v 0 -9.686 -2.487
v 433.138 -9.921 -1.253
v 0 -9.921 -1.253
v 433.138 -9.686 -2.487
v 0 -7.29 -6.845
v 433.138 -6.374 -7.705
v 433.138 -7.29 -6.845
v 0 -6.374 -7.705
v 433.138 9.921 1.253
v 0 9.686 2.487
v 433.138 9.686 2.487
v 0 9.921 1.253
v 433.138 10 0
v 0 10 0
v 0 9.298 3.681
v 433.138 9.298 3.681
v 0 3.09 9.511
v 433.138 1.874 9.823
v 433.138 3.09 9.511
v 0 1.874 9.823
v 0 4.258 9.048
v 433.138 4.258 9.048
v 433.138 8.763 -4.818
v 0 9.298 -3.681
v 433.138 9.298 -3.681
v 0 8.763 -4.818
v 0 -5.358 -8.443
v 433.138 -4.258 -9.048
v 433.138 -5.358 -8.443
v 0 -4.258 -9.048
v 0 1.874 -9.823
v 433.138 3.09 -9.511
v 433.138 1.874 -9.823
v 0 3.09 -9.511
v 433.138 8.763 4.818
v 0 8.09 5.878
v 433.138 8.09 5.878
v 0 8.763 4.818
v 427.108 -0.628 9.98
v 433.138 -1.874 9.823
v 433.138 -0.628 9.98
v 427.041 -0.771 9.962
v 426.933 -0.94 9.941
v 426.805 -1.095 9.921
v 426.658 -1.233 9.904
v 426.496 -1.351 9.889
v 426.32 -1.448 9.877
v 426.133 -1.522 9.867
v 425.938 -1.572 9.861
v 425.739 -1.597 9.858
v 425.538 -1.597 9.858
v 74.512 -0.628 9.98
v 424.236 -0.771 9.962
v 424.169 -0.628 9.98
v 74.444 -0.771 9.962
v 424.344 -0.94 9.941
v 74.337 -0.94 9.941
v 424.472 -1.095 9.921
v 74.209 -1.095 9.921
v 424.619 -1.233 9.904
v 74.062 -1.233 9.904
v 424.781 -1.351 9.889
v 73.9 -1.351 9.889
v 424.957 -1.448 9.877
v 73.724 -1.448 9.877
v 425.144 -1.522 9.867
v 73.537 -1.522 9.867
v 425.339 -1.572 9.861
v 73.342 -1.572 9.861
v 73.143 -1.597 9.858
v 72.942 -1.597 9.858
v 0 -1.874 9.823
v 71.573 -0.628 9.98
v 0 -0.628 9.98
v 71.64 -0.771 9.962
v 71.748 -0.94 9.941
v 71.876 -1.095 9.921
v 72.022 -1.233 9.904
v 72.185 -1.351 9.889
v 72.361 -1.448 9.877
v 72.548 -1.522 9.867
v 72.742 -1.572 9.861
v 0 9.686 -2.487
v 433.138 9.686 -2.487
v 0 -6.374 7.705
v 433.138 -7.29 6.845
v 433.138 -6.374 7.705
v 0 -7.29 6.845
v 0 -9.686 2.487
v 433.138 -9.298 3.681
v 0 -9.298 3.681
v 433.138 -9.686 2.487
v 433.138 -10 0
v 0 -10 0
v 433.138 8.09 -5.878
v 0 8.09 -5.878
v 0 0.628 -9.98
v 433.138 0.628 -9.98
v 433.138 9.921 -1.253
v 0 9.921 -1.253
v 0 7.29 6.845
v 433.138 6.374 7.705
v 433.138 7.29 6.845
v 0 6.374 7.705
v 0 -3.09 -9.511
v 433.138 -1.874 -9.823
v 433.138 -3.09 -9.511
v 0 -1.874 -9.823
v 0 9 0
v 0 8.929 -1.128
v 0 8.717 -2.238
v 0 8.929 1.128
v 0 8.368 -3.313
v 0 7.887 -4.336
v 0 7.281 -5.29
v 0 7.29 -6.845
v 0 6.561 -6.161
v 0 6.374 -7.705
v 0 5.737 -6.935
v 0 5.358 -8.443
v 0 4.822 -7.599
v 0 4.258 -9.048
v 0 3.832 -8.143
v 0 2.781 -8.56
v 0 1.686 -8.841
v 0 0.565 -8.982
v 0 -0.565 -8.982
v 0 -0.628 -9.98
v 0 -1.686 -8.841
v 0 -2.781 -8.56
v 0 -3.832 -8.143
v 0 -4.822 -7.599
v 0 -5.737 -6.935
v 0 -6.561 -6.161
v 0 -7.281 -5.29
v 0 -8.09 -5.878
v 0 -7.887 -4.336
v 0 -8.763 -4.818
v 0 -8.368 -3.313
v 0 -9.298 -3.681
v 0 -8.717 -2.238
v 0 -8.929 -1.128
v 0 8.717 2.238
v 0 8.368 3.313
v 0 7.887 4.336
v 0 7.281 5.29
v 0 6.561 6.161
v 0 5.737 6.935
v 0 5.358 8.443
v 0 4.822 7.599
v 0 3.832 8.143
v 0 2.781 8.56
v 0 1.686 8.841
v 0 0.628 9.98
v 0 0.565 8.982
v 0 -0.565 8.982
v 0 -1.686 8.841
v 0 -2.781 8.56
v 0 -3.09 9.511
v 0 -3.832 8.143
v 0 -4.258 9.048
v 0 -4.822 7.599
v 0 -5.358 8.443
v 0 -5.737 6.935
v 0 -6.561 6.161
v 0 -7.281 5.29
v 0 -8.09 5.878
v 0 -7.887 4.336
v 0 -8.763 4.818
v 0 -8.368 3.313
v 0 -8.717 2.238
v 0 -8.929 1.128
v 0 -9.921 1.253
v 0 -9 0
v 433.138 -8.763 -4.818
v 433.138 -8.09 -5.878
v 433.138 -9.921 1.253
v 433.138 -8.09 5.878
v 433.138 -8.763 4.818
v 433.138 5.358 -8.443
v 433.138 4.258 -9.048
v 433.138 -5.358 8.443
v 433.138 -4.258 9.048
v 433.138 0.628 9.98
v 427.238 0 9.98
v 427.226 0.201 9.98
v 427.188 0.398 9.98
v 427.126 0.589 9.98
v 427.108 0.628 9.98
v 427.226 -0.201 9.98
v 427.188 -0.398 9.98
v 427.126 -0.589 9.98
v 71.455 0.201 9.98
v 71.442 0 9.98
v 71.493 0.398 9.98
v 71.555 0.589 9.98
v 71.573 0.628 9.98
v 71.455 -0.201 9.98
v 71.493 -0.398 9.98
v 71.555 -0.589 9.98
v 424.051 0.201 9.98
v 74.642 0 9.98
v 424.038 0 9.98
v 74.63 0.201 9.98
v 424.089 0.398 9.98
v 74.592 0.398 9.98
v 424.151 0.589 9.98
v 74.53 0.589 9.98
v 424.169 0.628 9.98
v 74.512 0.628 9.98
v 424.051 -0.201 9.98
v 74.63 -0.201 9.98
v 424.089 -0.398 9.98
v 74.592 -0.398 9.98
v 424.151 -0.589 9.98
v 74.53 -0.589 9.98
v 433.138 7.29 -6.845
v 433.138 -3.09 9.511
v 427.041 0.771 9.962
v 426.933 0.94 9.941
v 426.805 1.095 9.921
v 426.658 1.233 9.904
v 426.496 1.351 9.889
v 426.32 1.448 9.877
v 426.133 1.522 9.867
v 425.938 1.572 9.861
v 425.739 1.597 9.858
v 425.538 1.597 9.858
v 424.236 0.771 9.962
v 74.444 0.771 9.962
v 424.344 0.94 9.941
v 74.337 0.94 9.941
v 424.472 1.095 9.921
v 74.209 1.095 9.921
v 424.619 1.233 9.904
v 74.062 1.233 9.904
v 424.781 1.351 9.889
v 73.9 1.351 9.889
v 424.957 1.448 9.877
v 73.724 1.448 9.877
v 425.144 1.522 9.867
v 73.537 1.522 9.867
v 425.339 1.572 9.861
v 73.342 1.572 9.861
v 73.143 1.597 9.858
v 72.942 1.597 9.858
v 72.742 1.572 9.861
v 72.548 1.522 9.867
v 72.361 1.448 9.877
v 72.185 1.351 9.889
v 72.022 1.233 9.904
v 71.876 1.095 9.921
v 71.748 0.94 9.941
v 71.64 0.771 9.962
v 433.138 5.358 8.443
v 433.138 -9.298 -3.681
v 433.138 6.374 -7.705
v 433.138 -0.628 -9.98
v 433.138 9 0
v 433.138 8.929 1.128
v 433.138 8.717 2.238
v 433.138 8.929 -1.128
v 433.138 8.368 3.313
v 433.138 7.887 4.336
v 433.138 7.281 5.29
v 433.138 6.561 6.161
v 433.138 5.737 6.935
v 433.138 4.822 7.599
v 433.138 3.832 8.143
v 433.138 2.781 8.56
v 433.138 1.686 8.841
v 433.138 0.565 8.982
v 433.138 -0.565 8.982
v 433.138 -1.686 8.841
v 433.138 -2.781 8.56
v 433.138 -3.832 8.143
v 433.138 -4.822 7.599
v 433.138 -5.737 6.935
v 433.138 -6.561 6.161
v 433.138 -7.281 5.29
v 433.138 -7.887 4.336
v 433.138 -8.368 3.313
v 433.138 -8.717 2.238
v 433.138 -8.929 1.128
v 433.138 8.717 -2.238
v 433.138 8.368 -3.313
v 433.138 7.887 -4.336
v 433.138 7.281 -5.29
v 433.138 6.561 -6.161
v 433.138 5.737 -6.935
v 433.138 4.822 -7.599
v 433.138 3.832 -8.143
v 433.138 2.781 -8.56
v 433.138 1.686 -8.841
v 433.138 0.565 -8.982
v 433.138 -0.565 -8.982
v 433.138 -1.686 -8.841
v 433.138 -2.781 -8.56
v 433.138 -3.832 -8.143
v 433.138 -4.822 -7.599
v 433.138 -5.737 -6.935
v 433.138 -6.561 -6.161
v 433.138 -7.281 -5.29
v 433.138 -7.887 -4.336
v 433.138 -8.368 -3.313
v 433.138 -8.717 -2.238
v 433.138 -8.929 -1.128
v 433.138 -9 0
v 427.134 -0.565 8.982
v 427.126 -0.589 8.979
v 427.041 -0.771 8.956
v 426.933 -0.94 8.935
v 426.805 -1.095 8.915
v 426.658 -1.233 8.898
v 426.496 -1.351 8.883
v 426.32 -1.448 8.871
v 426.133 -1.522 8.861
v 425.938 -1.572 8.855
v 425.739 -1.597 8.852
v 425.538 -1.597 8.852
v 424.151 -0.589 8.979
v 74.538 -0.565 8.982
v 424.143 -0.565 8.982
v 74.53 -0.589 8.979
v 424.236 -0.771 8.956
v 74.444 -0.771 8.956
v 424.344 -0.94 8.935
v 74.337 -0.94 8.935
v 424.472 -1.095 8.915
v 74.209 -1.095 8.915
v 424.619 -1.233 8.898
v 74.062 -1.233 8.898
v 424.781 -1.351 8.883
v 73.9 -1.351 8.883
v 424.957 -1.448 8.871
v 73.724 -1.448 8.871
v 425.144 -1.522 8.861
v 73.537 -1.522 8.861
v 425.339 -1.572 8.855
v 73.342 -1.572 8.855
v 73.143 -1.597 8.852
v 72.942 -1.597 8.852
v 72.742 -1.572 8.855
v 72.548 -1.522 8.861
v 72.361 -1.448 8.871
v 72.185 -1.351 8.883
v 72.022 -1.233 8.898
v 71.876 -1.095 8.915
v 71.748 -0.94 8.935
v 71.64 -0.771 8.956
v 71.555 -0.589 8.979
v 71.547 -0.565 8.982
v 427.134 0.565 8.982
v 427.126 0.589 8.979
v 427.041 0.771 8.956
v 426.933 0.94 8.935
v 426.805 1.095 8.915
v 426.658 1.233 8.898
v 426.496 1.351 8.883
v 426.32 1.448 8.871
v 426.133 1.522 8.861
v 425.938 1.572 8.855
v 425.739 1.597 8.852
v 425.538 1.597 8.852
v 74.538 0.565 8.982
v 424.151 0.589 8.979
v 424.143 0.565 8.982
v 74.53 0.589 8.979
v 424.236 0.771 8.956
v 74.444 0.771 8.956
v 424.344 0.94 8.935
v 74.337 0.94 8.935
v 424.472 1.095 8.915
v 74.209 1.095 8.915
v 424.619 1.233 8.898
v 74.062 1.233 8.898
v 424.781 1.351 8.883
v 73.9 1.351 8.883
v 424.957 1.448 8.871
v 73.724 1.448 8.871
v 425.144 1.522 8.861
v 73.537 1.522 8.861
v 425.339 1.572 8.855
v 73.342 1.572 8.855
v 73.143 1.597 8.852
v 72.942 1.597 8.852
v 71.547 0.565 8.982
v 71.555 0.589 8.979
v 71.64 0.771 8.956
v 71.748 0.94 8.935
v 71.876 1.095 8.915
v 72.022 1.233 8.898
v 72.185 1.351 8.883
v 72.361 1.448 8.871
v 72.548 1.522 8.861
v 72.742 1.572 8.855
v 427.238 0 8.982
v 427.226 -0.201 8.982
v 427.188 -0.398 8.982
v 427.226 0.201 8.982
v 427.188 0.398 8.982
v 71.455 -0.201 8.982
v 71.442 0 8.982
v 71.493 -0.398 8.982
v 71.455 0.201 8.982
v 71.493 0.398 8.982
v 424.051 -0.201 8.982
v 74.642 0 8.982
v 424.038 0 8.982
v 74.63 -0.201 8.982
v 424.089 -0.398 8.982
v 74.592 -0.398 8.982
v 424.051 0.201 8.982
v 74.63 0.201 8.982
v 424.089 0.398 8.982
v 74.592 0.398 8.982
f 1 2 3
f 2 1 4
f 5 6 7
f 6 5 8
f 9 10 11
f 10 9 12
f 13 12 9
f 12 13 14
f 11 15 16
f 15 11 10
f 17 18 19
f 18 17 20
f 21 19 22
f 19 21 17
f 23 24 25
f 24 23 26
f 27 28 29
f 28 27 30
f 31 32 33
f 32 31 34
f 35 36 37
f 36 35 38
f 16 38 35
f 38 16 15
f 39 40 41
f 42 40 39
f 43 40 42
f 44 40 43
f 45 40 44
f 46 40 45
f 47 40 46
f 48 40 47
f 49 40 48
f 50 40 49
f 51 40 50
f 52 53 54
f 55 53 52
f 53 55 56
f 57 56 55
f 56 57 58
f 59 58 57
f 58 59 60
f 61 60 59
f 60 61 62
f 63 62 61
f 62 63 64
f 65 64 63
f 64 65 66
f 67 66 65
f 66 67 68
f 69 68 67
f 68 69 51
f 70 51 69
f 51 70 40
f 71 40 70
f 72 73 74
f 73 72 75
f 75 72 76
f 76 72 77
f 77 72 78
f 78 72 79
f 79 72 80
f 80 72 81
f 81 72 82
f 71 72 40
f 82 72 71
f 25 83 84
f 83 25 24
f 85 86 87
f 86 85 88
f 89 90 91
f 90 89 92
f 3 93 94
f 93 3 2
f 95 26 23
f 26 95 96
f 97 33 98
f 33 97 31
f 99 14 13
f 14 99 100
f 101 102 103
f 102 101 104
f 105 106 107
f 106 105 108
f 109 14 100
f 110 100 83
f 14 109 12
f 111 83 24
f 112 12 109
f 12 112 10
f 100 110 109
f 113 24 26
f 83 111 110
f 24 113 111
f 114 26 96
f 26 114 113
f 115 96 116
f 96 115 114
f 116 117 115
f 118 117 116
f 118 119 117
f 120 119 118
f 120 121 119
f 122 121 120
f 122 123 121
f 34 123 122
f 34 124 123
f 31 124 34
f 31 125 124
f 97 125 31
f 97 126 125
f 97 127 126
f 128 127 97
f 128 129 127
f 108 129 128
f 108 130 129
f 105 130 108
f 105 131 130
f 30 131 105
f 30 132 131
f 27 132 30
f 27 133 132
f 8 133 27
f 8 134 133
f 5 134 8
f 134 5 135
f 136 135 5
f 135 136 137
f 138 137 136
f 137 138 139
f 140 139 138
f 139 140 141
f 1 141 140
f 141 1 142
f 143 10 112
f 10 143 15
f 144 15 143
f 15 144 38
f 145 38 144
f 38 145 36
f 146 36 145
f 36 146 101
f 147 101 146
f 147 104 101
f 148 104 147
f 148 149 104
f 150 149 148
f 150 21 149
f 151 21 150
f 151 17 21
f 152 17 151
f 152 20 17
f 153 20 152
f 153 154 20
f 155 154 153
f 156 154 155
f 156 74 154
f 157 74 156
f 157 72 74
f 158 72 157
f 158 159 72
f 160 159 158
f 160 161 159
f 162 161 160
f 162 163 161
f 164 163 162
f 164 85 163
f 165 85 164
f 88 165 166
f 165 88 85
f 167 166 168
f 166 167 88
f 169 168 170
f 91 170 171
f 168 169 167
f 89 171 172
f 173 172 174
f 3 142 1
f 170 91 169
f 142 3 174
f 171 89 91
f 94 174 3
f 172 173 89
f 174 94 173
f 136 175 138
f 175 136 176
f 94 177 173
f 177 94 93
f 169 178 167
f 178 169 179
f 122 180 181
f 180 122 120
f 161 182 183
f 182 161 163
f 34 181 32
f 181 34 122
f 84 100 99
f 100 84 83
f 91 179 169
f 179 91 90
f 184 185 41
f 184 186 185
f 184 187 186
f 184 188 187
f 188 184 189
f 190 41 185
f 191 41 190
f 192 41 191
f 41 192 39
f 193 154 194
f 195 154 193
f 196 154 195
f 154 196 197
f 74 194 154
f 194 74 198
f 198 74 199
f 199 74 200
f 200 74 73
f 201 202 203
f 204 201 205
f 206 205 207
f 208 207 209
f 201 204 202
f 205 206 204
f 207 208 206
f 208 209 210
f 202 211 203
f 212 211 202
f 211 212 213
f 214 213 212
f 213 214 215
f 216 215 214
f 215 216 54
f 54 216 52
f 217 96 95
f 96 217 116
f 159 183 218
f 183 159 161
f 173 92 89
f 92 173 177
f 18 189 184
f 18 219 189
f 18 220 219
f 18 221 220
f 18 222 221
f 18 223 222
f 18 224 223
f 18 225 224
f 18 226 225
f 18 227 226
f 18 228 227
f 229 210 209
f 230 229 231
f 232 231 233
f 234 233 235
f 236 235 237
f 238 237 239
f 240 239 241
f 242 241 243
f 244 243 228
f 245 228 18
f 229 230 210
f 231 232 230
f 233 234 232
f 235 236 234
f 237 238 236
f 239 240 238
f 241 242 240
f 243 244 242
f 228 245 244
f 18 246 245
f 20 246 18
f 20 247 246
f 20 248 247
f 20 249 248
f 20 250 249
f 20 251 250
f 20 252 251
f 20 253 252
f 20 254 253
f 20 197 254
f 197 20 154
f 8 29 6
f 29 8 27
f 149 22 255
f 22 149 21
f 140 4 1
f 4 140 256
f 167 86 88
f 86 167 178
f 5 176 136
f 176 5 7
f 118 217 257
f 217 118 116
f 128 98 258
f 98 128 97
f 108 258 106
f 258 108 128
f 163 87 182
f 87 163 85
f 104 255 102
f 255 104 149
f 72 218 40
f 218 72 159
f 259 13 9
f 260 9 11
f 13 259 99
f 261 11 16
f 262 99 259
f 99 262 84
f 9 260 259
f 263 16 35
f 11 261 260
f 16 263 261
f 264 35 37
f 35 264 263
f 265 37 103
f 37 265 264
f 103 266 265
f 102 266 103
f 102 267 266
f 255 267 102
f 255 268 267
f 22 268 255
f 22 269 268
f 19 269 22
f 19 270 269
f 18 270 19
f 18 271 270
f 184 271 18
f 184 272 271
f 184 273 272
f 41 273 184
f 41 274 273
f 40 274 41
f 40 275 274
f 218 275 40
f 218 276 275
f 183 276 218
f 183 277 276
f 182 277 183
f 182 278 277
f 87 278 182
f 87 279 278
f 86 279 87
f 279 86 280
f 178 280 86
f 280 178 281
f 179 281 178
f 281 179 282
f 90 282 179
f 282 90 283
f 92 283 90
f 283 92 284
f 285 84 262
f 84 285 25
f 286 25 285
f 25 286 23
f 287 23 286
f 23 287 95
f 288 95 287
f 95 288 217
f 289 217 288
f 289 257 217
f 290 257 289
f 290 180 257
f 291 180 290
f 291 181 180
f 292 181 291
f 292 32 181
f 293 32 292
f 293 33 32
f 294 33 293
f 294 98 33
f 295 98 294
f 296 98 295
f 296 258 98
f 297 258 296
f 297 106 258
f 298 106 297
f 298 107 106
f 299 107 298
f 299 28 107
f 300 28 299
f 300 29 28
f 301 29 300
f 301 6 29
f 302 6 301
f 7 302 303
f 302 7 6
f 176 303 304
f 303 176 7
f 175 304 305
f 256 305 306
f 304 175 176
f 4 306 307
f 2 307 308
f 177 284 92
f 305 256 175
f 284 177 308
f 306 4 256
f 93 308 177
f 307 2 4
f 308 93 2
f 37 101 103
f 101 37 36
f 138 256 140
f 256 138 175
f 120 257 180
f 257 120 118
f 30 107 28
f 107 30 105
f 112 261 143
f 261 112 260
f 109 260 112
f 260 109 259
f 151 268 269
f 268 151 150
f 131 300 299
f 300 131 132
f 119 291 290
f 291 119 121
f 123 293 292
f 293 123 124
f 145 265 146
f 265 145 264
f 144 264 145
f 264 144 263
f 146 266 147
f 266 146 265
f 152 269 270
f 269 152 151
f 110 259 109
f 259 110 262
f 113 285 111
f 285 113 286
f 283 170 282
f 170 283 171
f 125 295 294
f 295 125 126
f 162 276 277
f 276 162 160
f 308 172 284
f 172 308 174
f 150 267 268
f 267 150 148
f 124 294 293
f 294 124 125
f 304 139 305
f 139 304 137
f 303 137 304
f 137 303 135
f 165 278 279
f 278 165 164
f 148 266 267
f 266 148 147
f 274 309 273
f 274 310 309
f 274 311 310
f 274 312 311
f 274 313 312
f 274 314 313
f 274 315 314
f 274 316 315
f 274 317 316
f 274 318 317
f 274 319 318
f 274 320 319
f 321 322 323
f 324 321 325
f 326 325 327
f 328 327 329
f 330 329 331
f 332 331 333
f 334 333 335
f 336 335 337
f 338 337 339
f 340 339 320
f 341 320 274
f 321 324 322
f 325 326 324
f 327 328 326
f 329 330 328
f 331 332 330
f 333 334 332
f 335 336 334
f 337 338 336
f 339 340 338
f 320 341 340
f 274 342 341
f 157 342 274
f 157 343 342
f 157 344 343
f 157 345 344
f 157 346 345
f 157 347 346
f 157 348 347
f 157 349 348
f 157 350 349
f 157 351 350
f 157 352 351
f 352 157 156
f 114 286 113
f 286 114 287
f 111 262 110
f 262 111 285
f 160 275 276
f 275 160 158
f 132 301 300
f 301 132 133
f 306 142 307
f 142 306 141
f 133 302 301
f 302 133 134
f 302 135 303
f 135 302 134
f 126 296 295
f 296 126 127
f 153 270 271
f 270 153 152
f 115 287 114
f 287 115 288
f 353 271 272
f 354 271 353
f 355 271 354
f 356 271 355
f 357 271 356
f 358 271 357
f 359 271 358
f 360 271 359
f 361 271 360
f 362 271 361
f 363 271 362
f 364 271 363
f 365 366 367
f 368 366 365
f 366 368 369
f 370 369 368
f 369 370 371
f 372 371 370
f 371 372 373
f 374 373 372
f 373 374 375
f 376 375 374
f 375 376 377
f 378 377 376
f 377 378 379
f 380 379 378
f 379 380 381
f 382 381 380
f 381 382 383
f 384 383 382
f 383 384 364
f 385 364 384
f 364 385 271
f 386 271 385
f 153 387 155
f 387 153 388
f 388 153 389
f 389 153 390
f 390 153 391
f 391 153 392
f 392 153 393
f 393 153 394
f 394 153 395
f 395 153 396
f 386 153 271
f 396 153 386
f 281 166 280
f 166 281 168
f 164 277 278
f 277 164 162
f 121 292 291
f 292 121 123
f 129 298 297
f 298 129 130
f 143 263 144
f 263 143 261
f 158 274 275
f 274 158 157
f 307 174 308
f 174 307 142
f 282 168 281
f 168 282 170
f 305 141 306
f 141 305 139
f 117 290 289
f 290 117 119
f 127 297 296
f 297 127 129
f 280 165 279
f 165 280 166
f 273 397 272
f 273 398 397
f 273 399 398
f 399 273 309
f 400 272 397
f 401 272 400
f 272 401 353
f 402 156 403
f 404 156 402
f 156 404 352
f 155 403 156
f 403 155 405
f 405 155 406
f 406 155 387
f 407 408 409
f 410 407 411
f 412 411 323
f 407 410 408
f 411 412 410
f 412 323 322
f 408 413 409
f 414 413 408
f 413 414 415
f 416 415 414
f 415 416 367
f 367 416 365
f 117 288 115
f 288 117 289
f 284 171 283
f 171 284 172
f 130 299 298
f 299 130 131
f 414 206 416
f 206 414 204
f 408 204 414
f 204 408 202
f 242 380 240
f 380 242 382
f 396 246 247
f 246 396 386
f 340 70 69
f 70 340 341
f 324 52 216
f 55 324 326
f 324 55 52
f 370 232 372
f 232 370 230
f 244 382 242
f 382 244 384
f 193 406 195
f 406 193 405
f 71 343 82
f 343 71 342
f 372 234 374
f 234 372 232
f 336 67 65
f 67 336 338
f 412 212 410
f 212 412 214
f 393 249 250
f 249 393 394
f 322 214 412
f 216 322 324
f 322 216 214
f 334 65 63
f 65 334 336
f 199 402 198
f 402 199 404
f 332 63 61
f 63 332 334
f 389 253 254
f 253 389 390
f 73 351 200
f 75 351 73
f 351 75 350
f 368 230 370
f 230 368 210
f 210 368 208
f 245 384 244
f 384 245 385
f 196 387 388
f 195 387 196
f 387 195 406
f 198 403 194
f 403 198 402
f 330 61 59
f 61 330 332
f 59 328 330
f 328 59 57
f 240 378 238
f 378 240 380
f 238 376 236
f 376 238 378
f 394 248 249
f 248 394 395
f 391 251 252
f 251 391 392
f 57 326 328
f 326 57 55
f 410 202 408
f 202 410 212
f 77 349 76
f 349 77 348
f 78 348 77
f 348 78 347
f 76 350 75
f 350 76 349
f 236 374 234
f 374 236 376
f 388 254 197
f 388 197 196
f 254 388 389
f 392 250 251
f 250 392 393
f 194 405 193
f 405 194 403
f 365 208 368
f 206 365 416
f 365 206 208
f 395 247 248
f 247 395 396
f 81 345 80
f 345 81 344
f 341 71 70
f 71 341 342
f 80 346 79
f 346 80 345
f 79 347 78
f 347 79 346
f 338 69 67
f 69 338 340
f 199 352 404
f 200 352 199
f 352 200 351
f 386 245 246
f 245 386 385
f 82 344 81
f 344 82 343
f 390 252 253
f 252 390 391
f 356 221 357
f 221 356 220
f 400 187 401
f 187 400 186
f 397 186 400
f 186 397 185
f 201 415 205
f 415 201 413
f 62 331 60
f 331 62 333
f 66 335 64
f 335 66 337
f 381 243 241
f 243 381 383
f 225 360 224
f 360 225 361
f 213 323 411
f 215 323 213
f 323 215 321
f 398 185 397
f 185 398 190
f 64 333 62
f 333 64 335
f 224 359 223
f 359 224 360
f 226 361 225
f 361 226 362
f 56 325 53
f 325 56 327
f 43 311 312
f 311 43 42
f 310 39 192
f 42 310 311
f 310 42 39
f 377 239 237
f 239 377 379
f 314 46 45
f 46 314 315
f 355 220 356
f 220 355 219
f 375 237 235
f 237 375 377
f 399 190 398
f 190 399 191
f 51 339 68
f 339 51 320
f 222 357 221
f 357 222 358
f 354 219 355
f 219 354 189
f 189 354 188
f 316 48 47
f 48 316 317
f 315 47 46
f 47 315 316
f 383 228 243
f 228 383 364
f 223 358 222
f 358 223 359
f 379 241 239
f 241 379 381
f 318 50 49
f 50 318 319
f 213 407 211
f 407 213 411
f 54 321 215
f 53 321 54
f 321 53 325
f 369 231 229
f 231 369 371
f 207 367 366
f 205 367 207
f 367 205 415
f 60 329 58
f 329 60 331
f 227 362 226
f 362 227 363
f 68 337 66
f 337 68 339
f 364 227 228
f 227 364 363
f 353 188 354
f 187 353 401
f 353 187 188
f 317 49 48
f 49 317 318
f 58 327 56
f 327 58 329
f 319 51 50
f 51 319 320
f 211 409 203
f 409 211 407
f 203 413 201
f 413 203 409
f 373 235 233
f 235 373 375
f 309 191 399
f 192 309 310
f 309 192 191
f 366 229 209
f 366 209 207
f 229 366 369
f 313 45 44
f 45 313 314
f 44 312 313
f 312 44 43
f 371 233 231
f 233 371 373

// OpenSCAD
// file: parameters.scad
arm_n = 6;
rotor_diameter = 250;
drone_diameter = (rotor_diameter/sin(180/arm_n));

global_clearence = 0.1;


// M3 parameters =========================================
M3_screw_diameter = 3.2;
M3_nut_height = 2.7;
M3_nut_diameter = 6.6;
M3_nut_pocket = 5.6;


// Battery size ==========================================
Battery_length = 195;
Battery_height = 91;
Battery_width = 64;


// 3D printer para. ======================================
print_plate_x = 200;
print_plate_y = 220;


// motor parameters ======================================
motor_diameter = 40;
motor_height = 18;
motor_n_screws = 4;
motor_screws_diameter = 20;


// motor holder para. (666_1001) =========================
motor_plate_height = 7;
motor_plate_diameter = motor_diameter;
motor_plate_hole_diameter = 10;
motor_tube_x_offset = motor_diameter/2 - 5;
motor_tube_z_offset = 20;

screws_n = 2;
screws_gap = 15;
screws_offset_x = 7.5;
screws_offset_y = 5;
holding_part_x = 30;
upper_holding_part_height = 15;
washer_size_x = 10;


// avionics plate para. (666_1003) =======================
avionics_plate_diameter = 200;
avionics_plate_height = 3;
avionics_plate_z_offset = 25;

av_screws_diameter = 160;
av_cable_holes_offset = 70;
av_cable_holes_width = 8;
av_cable_holes_length = 20;


// mid poly base para. (666_1004) ========================
mid_poly_diameter = 120;
mid_poly_low_diameter = mid_poly_diameter*cos(180/arm_n);
mid_poly_side = mid_poly_low_diameter*tan(180/arm_n);


// arm pipe para. (888_1002) =============================
arm_pipe_diameter = 20;
arm_pipe_inner_diameter = 18;
arm_pipe_x_offset = mid_poly_low_diameter/2-.1;
arm_pipe_z_offset = 5;
arm_pipe_length = drone_diameter-motor_tube_x_offset-arm_pipe_x_offset;


// main base para. (666_1004) ============================
base_diameter = 300;
base_height = 40;
base_bottom_height = base_height/2;
base_arm_screw_x_offset = 5;

base_low_diameter = base_diameter*cos(180/arm_n);
base_side = base_low_diameter*tan(180/arm_n);
base_arm_washer_width = 10;
base_middle_hole_diameter = 70;
base_middle_screws_diameter = base_middle_hole_diameter+10;

screws_x_offset_inside = 5;
screws_x_offset_outside = 15;
screws_y_offset = 2.5;
screws_z_offset = (base_bottom_height-arm_pipe_diameter/2)/2;

cutting_edge_width = 10;
screws_joining_sides_diameter = base_diameter-50;


// mid poly if base cant fit =============================
base_can_fit = base_diameter <= min(print_plate_x,print_plate_y) ? true : false;
// main file
include <parameters.scad>;

module 888_1002(draft) {
    difference() {
        rotate([90,0,90])
        union() {
            difference() {
                cylinder(arm_pipe_length, d=arm_pipe_diameter, $fn = draft ? 10 : 50);
                translate([0,0,-1])
                cylinder(arm_pipe_length+2, d=arm_pipe_inner_diameter, $fn = draft ? 10 : 50);
            } 
        }
        
    translate([base_low_diameter/2-base_arm_screw_x_offset-arm_pipe_x_offset,0,0])
    cylinder(arm_pipe_diameter, d=M3_screw_diameter, $fn = draft ? 10 : 50);   
        
    translate([arm_pipe_length-screws_offset_x,0,0])
    cylinder(arm_pipe_diameter, d=M3_screw_diameter, $fn = draft ? 10 : 50);   
    }
        
}

888_1002();
